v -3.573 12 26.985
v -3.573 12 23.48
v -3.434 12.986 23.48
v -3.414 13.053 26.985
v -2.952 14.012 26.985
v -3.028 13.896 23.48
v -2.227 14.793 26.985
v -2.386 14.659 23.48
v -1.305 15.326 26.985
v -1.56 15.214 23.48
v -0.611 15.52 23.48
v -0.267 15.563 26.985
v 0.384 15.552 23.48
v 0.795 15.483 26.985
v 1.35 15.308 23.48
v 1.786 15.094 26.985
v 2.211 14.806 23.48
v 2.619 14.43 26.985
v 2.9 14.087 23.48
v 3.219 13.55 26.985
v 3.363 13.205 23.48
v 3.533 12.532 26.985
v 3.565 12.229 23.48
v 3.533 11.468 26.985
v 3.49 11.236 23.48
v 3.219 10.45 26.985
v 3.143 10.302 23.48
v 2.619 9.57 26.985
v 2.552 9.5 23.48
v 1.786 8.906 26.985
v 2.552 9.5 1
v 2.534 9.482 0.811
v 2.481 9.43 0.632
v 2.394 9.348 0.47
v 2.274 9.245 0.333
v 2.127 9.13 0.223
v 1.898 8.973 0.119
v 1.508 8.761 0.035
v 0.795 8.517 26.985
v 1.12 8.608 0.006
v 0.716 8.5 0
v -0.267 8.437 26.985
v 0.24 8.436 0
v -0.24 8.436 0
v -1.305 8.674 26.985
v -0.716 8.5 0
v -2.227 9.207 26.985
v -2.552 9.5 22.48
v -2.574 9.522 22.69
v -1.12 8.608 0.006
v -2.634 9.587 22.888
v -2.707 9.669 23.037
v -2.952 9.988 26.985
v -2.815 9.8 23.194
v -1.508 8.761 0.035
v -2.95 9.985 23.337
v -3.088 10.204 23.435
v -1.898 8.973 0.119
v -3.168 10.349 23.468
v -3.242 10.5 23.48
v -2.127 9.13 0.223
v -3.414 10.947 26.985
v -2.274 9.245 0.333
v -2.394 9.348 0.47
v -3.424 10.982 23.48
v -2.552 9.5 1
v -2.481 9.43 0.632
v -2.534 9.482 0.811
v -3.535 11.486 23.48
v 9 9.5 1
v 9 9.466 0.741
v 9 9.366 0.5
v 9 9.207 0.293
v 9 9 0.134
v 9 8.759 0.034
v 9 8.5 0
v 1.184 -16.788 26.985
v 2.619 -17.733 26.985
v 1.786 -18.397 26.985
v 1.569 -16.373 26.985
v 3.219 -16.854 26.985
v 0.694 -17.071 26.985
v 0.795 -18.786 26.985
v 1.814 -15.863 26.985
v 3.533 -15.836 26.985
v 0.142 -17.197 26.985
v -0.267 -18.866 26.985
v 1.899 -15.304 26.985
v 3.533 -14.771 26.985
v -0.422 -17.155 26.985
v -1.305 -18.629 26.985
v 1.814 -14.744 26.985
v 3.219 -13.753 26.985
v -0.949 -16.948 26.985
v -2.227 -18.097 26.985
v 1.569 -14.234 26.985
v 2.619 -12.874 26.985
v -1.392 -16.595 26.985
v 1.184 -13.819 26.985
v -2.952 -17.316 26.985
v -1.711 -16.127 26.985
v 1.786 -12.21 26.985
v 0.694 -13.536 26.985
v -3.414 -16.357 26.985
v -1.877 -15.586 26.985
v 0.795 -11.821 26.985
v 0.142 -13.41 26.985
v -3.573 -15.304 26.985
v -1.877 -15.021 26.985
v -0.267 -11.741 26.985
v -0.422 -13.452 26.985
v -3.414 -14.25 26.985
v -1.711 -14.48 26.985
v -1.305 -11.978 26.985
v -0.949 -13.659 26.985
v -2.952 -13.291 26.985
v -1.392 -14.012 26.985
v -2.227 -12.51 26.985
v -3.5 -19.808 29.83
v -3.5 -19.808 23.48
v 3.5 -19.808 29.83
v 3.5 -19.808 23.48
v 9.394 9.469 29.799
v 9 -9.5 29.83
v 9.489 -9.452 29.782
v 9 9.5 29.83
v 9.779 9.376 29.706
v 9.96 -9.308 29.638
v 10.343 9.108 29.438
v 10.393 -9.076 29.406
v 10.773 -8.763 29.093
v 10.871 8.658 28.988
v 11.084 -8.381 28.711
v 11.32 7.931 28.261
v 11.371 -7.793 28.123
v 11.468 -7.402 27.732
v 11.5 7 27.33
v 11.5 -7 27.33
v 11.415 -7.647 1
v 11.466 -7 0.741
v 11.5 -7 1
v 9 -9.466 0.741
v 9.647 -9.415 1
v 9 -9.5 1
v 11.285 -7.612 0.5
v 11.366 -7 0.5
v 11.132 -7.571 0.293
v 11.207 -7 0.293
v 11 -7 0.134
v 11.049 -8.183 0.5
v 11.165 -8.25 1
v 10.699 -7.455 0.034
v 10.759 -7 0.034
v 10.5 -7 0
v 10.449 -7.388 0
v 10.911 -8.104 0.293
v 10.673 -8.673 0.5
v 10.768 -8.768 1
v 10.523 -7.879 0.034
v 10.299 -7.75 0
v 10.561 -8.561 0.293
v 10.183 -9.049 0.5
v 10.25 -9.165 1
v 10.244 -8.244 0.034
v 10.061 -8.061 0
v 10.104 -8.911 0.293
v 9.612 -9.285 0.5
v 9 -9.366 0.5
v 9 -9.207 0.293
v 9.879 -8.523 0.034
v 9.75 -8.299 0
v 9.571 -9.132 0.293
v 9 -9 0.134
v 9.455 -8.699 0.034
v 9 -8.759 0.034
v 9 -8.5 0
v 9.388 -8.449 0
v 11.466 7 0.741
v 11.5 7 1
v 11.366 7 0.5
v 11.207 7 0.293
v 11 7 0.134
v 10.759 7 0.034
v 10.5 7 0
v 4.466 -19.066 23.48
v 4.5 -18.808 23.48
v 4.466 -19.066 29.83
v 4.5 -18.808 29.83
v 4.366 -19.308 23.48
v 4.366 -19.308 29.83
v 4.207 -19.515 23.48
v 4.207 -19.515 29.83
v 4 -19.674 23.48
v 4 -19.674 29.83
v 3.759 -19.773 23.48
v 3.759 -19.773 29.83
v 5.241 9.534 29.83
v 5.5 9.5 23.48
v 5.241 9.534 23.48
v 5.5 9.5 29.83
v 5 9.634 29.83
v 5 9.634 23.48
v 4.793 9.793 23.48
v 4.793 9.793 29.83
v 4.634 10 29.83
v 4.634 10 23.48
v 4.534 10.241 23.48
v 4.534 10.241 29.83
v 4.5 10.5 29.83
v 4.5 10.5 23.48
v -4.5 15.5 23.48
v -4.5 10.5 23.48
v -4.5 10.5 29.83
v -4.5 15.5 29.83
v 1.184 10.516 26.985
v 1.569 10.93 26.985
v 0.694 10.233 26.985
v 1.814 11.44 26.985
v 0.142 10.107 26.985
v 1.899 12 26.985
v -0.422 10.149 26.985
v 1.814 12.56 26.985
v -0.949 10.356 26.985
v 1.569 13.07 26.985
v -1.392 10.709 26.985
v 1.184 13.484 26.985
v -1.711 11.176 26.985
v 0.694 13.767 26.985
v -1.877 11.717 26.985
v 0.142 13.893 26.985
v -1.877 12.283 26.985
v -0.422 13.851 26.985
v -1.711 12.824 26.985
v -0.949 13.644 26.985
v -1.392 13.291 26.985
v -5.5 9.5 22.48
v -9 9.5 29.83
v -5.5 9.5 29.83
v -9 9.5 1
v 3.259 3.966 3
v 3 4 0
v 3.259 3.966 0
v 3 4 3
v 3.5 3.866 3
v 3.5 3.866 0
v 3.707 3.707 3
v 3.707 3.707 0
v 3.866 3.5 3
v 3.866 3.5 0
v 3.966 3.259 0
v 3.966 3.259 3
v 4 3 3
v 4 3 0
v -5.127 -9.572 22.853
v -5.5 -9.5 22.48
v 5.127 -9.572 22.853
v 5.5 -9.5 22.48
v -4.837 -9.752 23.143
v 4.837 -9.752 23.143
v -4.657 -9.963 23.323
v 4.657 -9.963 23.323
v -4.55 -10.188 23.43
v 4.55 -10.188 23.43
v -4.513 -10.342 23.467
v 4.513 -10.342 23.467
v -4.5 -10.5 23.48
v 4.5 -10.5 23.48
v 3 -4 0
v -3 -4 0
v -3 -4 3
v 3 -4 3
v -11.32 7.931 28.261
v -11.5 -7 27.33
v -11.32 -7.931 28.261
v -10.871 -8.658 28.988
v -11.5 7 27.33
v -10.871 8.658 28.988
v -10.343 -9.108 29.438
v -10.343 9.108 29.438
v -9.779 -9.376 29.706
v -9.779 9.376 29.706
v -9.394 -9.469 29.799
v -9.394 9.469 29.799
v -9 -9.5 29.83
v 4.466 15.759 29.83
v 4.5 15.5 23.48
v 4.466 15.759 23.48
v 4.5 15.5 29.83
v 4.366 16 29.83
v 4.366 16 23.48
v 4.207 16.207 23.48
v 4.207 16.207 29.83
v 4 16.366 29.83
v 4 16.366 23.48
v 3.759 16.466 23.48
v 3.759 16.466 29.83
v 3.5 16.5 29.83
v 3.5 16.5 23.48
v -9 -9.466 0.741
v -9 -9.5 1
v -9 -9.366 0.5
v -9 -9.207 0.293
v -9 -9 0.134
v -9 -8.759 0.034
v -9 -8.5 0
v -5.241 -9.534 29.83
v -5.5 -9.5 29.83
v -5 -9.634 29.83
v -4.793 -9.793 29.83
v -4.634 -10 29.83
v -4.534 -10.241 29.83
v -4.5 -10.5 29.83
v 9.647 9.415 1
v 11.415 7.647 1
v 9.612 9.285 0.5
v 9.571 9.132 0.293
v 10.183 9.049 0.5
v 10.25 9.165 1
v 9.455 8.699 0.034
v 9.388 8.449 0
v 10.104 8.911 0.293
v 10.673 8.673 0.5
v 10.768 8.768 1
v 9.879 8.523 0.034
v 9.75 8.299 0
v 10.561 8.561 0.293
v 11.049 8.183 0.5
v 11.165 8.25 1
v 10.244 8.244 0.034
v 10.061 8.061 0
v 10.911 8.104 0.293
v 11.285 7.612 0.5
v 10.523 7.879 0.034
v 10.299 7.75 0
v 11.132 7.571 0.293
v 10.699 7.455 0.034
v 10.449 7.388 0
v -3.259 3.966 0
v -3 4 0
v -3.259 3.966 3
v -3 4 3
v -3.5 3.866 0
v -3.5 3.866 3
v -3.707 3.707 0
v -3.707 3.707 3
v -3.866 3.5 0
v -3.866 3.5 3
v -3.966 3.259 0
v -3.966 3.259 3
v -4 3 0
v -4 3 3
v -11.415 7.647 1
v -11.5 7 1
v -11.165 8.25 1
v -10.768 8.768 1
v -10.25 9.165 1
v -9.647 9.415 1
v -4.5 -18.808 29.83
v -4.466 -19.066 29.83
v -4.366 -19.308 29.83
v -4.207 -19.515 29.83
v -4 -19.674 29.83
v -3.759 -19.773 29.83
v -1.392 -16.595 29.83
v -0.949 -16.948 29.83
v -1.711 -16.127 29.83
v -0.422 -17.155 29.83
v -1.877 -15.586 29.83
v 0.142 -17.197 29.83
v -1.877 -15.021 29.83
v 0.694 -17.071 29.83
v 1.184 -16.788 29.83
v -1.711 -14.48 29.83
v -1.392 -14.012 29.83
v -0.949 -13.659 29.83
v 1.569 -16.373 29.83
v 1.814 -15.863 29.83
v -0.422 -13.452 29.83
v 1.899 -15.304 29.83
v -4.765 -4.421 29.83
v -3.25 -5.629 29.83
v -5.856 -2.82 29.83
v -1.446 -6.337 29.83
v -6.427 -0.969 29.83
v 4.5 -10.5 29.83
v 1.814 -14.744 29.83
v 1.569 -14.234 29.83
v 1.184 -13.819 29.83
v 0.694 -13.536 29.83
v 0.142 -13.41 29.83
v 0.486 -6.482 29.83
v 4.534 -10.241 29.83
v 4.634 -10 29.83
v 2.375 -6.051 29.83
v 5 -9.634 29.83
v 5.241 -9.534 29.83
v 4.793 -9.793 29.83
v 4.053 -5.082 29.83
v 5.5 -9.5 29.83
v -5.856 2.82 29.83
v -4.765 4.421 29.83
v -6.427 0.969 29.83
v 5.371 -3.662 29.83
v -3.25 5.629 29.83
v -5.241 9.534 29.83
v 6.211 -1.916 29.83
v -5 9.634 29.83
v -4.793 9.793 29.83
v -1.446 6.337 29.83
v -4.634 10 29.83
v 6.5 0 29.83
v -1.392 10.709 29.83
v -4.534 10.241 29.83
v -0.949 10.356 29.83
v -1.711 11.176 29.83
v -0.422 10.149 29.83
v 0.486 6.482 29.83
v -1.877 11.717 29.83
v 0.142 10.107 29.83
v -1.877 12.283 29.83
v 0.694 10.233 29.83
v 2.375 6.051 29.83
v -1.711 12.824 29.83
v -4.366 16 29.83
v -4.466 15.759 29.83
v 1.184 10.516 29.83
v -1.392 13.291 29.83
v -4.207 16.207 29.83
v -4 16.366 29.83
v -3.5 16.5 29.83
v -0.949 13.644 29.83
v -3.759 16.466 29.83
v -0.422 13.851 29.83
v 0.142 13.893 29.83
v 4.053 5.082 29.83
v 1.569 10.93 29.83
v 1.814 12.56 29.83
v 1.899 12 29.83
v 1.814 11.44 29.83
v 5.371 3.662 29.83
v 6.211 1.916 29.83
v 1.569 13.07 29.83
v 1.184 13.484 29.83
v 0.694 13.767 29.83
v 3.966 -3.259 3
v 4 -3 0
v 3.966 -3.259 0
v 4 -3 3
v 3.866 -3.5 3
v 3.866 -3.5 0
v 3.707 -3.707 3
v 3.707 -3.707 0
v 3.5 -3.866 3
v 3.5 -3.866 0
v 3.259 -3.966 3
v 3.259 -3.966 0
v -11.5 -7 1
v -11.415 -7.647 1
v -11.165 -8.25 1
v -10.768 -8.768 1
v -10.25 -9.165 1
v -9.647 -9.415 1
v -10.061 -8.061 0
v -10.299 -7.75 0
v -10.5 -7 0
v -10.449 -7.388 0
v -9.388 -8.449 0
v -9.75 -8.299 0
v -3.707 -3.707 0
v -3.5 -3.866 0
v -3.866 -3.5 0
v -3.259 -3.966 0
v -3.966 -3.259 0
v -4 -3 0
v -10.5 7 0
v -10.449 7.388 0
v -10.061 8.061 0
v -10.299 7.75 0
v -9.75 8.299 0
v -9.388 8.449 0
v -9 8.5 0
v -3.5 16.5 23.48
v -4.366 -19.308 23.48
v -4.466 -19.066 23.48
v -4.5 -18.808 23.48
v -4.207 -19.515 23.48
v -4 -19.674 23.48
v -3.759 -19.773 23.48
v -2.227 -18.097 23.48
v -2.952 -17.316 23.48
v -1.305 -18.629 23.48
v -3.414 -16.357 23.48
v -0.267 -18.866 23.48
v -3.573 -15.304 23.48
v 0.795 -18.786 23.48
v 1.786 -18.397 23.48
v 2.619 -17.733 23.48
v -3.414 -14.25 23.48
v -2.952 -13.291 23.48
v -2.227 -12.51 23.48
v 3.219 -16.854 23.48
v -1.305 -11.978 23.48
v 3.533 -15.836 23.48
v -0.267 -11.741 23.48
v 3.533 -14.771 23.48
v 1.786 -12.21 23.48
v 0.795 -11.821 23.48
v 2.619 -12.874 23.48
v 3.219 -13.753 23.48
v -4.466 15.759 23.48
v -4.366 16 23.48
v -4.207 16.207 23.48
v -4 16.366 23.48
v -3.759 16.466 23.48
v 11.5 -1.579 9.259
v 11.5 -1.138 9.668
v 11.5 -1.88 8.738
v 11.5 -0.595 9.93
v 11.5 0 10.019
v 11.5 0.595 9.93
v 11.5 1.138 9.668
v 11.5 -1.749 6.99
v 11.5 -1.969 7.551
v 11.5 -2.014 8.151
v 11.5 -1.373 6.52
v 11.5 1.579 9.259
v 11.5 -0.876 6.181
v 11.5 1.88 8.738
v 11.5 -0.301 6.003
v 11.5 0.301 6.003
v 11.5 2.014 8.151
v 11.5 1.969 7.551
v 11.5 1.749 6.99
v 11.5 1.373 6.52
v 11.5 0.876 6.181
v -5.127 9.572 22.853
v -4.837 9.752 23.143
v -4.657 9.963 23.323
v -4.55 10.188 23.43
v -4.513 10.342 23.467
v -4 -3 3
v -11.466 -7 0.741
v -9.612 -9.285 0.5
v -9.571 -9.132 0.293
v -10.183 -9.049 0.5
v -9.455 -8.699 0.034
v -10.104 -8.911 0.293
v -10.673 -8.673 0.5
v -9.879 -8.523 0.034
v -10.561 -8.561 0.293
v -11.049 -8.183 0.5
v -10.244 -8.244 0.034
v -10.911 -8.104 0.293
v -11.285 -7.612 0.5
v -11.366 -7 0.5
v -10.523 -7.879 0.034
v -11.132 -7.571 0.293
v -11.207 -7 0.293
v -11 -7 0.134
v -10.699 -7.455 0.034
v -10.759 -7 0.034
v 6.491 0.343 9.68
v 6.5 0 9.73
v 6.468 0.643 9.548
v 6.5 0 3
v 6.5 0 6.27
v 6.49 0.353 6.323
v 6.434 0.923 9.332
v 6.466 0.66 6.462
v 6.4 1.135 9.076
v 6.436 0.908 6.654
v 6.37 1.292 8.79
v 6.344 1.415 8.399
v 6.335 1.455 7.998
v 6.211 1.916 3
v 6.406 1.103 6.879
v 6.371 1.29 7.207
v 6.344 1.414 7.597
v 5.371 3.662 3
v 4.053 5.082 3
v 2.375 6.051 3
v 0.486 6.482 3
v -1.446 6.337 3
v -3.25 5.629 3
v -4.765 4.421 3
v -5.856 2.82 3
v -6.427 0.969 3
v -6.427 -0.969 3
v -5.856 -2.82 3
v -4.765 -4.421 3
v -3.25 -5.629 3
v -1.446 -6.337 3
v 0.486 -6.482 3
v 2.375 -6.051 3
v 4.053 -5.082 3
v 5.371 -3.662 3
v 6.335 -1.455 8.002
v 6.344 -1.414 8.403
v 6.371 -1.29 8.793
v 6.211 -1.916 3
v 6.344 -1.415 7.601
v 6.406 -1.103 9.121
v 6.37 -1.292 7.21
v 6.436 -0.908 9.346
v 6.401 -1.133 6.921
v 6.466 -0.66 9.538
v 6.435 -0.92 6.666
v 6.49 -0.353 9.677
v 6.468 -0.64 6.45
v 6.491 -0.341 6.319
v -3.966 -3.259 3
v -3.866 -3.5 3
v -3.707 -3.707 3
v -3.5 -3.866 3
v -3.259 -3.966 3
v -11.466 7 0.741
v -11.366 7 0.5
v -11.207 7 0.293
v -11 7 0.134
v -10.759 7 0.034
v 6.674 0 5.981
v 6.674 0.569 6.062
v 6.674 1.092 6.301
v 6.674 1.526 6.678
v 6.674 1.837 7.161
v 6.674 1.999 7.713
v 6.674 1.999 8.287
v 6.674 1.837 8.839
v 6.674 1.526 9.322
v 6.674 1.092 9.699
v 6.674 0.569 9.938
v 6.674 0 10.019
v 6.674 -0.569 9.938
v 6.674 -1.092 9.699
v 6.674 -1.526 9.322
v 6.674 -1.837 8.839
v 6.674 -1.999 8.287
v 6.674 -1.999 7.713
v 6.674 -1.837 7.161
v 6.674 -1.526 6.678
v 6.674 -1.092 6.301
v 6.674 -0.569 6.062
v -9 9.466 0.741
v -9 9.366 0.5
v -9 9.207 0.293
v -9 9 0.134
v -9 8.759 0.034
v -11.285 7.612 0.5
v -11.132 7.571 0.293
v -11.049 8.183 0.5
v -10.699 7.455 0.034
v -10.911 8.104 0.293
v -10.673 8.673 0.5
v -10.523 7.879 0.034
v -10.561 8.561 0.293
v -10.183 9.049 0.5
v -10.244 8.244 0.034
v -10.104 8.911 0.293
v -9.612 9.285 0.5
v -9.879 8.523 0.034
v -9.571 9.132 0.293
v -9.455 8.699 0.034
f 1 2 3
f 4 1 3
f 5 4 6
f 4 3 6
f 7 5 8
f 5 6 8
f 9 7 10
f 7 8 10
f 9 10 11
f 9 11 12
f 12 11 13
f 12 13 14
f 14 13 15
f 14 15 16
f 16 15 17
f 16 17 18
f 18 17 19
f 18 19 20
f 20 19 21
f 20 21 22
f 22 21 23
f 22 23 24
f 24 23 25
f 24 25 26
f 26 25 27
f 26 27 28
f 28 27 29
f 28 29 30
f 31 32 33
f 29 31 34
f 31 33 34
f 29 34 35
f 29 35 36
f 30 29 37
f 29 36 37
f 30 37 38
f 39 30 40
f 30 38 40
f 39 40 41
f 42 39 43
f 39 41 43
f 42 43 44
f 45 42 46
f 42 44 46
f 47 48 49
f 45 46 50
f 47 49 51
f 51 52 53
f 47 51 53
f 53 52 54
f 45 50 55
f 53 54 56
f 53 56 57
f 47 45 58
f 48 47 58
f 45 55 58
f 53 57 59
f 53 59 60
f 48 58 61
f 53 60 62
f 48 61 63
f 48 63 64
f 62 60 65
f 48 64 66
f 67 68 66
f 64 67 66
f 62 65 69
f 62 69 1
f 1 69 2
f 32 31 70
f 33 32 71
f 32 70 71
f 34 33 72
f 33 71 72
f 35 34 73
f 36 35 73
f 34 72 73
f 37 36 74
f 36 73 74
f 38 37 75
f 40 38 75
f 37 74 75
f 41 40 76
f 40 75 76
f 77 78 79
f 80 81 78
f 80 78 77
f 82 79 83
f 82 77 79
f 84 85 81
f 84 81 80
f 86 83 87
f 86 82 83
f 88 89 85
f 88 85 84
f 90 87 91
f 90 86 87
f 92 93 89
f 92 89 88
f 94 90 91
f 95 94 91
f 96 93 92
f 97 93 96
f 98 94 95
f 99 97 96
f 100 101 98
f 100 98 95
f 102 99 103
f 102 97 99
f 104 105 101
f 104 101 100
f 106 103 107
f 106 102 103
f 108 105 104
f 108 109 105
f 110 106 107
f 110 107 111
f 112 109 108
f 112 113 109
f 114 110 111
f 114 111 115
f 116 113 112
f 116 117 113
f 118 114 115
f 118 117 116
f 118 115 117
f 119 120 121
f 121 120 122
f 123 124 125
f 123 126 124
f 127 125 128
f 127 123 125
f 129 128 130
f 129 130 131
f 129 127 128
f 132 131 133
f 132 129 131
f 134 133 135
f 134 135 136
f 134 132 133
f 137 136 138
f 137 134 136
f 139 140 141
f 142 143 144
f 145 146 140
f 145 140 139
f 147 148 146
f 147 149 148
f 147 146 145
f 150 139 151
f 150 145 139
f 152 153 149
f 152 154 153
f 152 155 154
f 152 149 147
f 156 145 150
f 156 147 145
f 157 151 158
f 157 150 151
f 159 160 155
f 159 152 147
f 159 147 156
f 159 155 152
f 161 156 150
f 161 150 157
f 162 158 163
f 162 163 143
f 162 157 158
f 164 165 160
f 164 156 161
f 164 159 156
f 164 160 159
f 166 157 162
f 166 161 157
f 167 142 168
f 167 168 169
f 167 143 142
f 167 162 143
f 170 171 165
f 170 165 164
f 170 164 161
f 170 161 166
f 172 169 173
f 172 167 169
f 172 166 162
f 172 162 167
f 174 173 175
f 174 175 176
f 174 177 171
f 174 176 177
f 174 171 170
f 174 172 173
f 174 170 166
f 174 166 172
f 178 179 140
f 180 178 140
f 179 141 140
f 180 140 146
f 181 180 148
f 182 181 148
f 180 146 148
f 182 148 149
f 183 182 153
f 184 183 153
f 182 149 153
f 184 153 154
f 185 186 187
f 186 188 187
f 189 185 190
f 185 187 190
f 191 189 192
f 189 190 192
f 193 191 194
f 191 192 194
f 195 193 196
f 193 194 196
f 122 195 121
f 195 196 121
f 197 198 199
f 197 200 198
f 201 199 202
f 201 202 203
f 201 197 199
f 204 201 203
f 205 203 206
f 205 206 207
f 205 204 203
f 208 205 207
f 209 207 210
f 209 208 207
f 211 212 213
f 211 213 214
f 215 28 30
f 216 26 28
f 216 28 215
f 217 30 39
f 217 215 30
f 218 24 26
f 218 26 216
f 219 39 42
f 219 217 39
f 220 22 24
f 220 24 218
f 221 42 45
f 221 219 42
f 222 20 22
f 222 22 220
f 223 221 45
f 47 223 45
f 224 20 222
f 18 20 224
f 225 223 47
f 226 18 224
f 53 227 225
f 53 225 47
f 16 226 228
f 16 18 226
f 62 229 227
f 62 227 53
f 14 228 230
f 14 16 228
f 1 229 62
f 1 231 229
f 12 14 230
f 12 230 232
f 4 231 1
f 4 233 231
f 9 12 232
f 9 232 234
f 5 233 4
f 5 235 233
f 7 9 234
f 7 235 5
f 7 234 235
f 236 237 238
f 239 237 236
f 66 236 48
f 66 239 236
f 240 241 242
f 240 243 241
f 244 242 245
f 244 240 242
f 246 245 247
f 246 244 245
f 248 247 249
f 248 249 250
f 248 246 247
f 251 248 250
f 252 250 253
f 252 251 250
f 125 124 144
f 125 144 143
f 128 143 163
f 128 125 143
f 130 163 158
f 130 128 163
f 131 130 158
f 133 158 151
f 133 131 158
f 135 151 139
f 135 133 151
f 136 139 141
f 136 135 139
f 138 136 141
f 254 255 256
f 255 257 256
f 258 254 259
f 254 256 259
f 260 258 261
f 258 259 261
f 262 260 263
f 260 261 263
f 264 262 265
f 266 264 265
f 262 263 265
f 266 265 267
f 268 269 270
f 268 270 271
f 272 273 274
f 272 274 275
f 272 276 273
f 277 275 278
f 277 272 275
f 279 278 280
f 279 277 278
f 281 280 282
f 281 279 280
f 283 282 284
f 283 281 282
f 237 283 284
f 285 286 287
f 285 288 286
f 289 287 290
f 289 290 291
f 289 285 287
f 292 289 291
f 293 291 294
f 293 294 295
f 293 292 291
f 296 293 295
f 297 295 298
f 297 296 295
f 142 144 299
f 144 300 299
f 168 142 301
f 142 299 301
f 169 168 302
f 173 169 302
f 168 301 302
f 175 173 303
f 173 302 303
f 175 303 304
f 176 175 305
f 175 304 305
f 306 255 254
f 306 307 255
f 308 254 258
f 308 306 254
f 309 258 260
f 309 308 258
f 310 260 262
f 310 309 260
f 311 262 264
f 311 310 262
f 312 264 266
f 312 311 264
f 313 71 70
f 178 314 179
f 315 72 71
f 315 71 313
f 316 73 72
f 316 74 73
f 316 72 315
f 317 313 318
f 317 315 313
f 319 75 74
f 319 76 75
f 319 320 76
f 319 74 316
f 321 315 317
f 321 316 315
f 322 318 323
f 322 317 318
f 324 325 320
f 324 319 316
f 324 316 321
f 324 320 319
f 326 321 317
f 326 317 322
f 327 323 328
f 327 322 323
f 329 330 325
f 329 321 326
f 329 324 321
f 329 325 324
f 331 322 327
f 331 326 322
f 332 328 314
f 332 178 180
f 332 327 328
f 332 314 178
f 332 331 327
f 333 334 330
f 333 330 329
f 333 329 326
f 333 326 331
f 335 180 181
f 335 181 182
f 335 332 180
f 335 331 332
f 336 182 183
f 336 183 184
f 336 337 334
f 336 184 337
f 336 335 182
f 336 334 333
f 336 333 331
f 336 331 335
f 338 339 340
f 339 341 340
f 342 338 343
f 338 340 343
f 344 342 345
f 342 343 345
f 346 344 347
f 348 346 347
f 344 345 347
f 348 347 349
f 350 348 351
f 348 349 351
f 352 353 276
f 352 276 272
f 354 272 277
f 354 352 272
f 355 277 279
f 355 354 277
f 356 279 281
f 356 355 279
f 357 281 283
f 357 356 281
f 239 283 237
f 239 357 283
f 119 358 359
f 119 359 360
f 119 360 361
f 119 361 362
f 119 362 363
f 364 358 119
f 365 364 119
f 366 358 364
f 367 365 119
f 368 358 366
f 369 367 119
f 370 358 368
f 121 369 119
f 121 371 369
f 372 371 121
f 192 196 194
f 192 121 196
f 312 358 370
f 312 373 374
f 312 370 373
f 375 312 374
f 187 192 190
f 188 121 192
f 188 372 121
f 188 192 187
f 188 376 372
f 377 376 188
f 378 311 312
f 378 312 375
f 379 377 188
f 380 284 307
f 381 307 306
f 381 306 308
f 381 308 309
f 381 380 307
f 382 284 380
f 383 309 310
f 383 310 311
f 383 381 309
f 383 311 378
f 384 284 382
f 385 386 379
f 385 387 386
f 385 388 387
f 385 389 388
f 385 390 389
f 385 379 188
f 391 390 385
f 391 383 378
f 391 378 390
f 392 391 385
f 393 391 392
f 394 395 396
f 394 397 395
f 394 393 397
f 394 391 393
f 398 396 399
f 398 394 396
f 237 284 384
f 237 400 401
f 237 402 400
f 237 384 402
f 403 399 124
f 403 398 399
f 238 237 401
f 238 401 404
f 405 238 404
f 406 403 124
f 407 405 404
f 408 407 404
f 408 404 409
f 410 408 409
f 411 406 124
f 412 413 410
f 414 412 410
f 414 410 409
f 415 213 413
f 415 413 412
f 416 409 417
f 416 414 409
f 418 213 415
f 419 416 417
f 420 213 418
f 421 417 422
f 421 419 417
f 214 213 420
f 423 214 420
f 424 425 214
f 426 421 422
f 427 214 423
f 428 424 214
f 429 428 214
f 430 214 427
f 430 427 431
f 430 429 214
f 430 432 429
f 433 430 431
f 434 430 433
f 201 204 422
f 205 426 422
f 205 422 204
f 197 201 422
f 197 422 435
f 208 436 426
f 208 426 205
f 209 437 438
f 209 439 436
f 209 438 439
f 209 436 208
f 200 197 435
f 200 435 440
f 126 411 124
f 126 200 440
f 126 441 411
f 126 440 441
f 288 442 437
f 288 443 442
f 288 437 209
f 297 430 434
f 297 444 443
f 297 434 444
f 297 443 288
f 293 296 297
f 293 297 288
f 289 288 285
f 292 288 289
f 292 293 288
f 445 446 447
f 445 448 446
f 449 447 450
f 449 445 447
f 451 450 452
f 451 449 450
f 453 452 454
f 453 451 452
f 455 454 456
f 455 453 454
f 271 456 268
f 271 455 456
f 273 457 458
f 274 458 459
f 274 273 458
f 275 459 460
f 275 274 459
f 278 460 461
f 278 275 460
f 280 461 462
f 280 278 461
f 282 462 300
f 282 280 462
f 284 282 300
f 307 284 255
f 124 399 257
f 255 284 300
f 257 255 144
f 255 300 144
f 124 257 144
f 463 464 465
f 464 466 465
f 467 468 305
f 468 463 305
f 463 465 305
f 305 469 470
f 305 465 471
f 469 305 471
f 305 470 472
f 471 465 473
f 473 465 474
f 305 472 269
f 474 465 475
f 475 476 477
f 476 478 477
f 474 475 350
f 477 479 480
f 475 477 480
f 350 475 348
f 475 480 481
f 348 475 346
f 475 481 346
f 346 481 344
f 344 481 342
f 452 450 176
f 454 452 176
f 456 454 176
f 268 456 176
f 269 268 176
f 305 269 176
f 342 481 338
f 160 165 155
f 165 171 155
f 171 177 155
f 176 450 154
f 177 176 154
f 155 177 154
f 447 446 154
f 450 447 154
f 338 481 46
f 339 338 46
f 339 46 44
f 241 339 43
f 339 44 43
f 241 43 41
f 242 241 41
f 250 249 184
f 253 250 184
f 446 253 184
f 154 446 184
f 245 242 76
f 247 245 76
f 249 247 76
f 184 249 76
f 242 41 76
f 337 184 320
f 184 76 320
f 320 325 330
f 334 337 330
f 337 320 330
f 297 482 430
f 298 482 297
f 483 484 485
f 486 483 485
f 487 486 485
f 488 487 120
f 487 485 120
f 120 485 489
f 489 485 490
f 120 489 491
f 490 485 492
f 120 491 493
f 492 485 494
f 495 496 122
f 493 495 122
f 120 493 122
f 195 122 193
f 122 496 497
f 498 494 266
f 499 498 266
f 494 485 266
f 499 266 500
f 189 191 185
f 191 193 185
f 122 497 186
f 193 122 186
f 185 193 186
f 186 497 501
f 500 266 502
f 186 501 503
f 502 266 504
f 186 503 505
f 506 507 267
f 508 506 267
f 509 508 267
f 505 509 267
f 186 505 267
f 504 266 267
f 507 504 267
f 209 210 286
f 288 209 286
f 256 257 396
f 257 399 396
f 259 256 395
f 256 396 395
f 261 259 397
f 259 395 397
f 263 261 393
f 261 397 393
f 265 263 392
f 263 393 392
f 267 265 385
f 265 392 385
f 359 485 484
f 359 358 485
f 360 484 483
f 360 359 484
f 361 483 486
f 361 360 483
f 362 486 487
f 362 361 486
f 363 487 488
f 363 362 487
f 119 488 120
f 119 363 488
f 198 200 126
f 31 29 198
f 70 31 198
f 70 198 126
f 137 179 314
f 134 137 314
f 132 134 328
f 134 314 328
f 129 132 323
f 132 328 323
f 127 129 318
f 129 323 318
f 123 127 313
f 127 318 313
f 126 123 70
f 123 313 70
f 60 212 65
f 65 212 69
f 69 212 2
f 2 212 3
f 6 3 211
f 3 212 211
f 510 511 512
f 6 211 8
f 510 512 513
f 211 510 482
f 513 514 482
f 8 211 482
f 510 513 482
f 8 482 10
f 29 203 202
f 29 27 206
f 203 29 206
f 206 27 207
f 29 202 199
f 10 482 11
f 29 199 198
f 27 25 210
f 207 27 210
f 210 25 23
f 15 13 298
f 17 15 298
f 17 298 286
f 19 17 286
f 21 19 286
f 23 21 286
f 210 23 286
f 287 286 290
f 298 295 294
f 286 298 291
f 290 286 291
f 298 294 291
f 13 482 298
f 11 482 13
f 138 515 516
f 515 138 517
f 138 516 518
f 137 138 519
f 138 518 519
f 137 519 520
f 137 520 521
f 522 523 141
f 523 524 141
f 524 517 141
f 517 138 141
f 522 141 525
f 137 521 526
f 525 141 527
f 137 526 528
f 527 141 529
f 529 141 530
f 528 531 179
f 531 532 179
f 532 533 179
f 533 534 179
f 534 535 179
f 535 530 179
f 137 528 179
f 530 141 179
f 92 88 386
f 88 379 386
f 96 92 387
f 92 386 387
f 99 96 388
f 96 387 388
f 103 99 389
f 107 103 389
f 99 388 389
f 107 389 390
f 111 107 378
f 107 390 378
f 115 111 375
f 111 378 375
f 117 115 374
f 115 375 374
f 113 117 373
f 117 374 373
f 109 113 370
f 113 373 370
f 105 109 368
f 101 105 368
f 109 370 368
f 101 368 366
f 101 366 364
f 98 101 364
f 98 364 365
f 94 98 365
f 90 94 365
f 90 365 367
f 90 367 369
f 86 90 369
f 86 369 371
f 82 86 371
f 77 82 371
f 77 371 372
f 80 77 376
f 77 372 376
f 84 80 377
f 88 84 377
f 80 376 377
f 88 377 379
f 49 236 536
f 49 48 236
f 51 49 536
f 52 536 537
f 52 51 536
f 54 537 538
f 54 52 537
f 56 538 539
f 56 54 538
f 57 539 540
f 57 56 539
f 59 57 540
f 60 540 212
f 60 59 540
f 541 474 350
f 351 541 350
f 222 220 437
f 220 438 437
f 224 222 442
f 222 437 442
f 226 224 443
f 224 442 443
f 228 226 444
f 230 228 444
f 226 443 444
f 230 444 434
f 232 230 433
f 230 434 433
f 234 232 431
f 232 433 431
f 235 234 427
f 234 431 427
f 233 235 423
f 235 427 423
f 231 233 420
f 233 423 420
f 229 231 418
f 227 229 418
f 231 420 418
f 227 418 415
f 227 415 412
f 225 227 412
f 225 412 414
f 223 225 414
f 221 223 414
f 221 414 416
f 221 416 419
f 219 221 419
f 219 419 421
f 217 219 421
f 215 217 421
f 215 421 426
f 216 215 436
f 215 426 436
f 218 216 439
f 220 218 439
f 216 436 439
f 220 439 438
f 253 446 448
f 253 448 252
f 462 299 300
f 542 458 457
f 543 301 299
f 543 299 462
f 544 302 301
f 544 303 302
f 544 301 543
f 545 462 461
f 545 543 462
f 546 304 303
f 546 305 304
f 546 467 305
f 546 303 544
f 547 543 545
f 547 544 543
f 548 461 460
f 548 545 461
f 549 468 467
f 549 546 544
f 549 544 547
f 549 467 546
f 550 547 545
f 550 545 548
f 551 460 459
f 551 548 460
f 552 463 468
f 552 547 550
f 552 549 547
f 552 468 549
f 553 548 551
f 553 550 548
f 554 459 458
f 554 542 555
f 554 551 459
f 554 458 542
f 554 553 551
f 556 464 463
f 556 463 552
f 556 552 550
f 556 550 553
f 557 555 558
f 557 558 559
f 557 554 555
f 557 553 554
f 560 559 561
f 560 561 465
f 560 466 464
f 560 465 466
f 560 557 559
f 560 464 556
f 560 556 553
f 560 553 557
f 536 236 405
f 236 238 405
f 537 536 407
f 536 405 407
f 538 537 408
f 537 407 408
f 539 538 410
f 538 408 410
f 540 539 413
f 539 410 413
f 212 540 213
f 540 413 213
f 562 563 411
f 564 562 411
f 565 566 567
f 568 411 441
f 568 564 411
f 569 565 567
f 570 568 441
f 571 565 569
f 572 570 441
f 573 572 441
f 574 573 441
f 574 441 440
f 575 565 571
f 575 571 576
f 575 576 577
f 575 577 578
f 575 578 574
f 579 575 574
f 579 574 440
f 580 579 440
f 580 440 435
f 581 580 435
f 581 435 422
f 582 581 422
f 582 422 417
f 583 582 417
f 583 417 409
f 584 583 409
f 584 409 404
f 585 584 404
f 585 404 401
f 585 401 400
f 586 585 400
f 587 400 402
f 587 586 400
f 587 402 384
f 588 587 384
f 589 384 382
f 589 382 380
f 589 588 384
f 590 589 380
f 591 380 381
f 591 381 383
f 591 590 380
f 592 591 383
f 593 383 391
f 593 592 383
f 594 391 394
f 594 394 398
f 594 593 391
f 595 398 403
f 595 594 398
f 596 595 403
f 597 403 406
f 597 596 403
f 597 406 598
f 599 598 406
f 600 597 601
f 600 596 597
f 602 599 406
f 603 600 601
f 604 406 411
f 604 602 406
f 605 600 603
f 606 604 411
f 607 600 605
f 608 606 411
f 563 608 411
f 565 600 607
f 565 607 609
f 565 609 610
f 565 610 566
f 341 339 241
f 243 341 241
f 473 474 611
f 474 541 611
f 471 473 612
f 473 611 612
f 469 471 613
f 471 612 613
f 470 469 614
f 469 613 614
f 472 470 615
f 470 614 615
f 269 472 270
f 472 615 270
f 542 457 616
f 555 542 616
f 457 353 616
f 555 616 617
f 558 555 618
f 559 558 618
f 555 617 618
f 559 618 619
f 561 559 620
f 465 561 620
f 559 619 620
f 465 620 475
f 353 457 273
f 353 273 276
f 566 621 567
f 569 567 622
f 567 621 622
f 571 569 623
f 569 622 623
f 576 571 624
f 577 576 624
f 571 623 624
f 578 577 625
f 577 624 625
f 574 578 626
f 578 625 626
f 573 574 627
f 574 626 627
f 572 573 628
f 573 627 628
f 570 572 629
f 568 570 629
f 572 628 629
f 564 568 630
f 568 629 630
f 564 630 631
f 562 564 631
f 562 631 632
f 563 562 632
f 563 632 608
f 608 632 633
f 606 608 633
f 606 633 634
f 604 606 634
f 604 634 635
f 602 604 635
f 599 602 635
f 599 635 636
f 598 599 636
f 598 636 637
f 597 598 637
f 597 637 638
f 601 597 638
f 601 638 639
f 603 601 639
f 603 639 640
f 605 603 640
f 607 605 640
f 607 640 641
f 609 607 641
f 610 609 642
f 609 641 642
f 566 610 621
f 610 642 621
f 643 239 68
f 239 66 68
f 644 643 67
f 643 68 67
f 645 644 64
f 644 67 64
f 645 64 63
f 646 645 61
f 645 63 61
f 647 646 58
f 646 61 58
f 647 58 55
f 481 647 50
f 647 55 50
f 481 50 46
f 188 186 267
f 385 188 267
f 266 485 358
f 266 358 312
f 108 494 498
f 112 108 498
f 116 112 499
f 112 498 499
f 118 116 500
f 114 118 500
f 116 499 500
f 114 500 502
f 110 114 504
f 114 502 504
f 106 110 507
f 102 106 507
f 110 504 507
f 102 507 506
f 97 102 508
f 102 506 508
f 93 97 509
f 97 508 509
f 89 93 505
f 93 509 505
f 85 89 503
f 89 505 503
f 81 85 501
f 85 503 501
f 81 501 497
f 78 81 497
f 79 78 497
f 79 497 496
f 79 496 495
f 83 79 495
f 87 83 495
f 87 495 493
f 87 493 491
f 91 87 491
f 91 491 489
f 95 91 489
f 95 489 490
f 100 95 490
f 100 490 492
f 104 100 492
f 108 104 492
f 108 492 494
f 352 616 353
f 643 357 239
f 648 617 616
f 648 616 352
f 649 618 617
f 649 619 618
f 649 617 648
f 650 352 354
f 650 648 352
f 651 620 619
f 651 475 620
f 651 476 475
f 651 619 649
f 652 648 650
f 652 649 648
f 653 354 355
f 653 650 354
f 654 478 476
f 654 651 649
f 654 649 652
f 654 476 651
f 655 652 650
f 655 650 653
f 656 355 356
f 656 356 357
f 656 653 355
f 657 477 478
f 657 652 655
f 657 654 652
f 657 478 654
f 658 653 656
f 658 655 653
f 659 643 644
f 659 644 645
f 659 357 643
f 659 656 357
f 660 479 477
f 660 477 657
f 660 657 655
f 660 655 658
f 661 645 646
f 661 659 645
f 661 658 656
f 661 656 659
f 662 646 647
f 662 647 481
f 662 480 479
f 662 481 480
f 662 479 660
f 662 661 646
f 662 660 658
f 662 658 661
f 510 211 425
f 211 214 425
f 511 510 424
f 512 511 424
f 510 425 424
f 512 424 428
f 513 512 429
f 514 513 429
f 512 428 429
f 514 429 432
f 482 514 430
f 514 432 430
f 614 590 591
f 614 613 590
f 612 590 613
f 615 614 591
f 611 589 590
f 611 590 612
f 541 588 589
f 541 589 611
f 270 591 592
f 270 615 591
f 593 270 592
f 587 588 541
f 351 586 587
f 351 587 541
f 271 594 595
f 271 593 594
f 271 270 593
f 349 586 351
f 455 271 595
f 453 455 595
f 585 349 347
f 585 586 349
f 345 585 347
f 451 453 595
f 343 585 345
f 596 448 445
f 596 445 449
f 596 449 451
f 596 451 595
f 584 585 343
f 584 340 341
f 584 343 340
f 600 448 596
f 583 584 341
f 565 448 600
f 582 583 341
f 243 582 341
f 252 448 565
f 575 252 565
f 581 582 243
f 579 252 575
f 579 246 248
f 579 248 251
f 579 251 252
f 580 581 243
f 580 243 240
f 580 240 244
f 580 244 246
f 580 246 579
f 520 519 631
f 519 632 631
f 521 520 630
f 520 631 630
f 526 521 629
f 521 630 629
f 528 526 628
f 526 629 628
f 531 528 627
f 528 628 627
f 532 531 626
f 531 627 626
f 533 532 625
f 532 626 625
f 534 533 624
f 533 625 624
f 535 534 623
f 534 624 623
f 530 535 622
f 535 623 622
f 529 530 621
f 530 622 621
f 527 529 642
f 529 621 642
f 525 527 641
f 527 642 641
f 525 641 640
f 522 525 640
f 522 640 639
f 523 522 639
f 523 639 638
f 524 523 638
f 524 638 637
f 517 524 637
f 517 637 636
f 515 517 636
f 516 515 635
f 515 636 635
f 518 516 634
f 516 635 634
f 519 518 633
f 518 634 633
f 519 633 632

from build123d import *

# Parameters (mm, degrees)
SKETCH1_W                                      = 23
SKETCH1_H                                      = 19
SKETCH1_W_2                                    = 8
SKETCH1_H_2                                    = 8
TOP_DEPTH                                      = 3
SKETCH1_4_W                                    = 23
SKETCH1_4_H                                    = 19
SKETCH1_4_R                                    = 6.5
BODY_DEPTH                                     = 29.83
TABS_START                                     = 23.48
SKETCH1_6_W                                    = 9
SKETCH1_6_H                                    = 7
SKETCH1_6_H_2                                  = 10.3075
TABS_DEPTH                                     = 6.35
F_36_0_1065_DIA_SET_SCREW_D                    = 4.0386
F_36_0_1065_DIA_SET_SCREW_DEPTH                = 4.826
F_36_0_1065_DIA_SET_SCREW_TIP                  = 1.213317848
CBORE_FOR_6_SOCKET_HEAD_CAP_SCREW1_D           = 3.7973
CBORE_FOR_6_SOCKET_HEAD_CAP_SCREW1_CBORE_D     = 7.14502
CBORE_FOR_6_SOCKET_HEAD_CAP_SCREW1_CBORE_DEPTH = 26.9851886
FILLET4_R                                      = 2.5
FILLET5_R                                      = 1


with BuildPart() as part:
    # Sketch1 → Top (new body)
    with BuildSketch(Plane.XY):
        Rectangle(SKETCH1_W, SKETCH1_H)
        Rectangle(SKETCH1_W_2, SKETCH1_H_2, mode=Mode.SUBTRACT)
    extrude(amount=TOP_DEPTH)

    # Sketch1<4> → Body (add)
    with BuildSketch(Plane.XY):
        Rectangle(SKETCH1_4_W, SKETCH1_4_H)
        Circle(SKETCH1_4_R, mode=Mode.SUBTRACT)
    extrude(amount=BODY_DEPTH)

    # Sketch1<6> → Tabs (add)
    with BuildSketch(Plane.XY.offset(TABS_START)):
        with Locations((0, 13)):
            Rectangle(SKETCH1_6_W, SKETCH1_6_H)
        with Locations((0, -14.65375)):
            Rectangle(SKETCH1_6_W, SKETCH1_6_H_2)
    extrude(amount=TABS_DEPTH)

    # #36 (0.1065) Dia. Set Screw
    with Locations(Plane(origin=(11.5, 0, 0), x_dir=(0, 0, -1), z_dir=(1, 0, 0))):
        with Locations((-8, 0)):
            Hole(F_36_0_1065_DIA_SET_SCREW_D / 2, depth=F_36_0_1065_DIA_SET_SCREW_DEPTH)
            with Locations((0, 0, -(F_36_0_1065_DIA_SET_SCREW_DEPTH + F_36_0_1065_DIA_SET_SCREW_TIP / 2))):  # 118° drill point
                Cone(0, F_36_0_1065_DIA_SET_SCREW_D / 2, F_36_0_1065_DIA_SET_SCREW_TIP, mode=Mode.SUBTRACT)

    # CBORE for #6 Socket Head Cap Screw1 (through all)
    with Locations(Plane(origin=(0, 12, 0), x_dir=(-1, 0, 0), z_dir=(0, 0, -1))):
        with Locations((0, 0), (0, -27.3035)):
            CounterBoreHole(CBORE_FOR_6_SOCKET_HEAD_CAP_SCREW1_D / 2, CBORE_FOR_6_SOCKET_HEAD_CAP_SCREW1_CBORE_D / 2, CBORE_FOR_6_SOCKET_HEAD_CAP_SCREW1_CBORE_DEPTH)

    # Fillet4
    fillet4_edges = [part.edges().sort_by_distance(p)[0] for p in [
        (-11.5, 9.5, 14.915),
        (-11.5, -9.5, 14.915),
        (11.5, -9.5, 14.915),
        (11.5, 9.5, 14.915),
        (-11.5, 0, 29.83),
        (11.5, 0, 29.83),
    ]]
    fillet(fillet4_edges, radius=FILLET4_R)

    # Fillet5
    fillet5_edges = [part.edges().sort_by_distance(p)[0] for p in [
        (-11.5, 0, 0),
        (11.5, 0, 0),
        (0, -9.5, 0),
        (-5.776012118, 9.5, 0),
        (10.767766953, 8.767766953, 0),
        (10.767766953, -8.767766953, 0),
        (-10.767766953, -8.767766953, 0),
        (-10.767766953, 8.767766953, 0),
        (-4, 4, 1.5),
        (-4, -4, 1.5),
        (4, -4, 1.5),
        (4, 4, 1.5),
        (-4.5, 16.5, 26.655),
        (-3.526012118, 9.5, 23.48),
        (-4.5, 9.5, 26.655),
        (4.5, 9.5, 26.655),
        (4.5, 16.5, 26.655),
        (4.5, -9.5, 26.655),
        (-4.5, -9.5, 26.655),
        (-4.5, -19.8075, 26.655),
        (4.5, -19.8075, 26.655),
        (0, -9.5, 23.48),
        (5.776012118, 9.5, 0),
    ]]
    fillet(fillet5_edges, radius=FILLET5_R)


solid = part.part
